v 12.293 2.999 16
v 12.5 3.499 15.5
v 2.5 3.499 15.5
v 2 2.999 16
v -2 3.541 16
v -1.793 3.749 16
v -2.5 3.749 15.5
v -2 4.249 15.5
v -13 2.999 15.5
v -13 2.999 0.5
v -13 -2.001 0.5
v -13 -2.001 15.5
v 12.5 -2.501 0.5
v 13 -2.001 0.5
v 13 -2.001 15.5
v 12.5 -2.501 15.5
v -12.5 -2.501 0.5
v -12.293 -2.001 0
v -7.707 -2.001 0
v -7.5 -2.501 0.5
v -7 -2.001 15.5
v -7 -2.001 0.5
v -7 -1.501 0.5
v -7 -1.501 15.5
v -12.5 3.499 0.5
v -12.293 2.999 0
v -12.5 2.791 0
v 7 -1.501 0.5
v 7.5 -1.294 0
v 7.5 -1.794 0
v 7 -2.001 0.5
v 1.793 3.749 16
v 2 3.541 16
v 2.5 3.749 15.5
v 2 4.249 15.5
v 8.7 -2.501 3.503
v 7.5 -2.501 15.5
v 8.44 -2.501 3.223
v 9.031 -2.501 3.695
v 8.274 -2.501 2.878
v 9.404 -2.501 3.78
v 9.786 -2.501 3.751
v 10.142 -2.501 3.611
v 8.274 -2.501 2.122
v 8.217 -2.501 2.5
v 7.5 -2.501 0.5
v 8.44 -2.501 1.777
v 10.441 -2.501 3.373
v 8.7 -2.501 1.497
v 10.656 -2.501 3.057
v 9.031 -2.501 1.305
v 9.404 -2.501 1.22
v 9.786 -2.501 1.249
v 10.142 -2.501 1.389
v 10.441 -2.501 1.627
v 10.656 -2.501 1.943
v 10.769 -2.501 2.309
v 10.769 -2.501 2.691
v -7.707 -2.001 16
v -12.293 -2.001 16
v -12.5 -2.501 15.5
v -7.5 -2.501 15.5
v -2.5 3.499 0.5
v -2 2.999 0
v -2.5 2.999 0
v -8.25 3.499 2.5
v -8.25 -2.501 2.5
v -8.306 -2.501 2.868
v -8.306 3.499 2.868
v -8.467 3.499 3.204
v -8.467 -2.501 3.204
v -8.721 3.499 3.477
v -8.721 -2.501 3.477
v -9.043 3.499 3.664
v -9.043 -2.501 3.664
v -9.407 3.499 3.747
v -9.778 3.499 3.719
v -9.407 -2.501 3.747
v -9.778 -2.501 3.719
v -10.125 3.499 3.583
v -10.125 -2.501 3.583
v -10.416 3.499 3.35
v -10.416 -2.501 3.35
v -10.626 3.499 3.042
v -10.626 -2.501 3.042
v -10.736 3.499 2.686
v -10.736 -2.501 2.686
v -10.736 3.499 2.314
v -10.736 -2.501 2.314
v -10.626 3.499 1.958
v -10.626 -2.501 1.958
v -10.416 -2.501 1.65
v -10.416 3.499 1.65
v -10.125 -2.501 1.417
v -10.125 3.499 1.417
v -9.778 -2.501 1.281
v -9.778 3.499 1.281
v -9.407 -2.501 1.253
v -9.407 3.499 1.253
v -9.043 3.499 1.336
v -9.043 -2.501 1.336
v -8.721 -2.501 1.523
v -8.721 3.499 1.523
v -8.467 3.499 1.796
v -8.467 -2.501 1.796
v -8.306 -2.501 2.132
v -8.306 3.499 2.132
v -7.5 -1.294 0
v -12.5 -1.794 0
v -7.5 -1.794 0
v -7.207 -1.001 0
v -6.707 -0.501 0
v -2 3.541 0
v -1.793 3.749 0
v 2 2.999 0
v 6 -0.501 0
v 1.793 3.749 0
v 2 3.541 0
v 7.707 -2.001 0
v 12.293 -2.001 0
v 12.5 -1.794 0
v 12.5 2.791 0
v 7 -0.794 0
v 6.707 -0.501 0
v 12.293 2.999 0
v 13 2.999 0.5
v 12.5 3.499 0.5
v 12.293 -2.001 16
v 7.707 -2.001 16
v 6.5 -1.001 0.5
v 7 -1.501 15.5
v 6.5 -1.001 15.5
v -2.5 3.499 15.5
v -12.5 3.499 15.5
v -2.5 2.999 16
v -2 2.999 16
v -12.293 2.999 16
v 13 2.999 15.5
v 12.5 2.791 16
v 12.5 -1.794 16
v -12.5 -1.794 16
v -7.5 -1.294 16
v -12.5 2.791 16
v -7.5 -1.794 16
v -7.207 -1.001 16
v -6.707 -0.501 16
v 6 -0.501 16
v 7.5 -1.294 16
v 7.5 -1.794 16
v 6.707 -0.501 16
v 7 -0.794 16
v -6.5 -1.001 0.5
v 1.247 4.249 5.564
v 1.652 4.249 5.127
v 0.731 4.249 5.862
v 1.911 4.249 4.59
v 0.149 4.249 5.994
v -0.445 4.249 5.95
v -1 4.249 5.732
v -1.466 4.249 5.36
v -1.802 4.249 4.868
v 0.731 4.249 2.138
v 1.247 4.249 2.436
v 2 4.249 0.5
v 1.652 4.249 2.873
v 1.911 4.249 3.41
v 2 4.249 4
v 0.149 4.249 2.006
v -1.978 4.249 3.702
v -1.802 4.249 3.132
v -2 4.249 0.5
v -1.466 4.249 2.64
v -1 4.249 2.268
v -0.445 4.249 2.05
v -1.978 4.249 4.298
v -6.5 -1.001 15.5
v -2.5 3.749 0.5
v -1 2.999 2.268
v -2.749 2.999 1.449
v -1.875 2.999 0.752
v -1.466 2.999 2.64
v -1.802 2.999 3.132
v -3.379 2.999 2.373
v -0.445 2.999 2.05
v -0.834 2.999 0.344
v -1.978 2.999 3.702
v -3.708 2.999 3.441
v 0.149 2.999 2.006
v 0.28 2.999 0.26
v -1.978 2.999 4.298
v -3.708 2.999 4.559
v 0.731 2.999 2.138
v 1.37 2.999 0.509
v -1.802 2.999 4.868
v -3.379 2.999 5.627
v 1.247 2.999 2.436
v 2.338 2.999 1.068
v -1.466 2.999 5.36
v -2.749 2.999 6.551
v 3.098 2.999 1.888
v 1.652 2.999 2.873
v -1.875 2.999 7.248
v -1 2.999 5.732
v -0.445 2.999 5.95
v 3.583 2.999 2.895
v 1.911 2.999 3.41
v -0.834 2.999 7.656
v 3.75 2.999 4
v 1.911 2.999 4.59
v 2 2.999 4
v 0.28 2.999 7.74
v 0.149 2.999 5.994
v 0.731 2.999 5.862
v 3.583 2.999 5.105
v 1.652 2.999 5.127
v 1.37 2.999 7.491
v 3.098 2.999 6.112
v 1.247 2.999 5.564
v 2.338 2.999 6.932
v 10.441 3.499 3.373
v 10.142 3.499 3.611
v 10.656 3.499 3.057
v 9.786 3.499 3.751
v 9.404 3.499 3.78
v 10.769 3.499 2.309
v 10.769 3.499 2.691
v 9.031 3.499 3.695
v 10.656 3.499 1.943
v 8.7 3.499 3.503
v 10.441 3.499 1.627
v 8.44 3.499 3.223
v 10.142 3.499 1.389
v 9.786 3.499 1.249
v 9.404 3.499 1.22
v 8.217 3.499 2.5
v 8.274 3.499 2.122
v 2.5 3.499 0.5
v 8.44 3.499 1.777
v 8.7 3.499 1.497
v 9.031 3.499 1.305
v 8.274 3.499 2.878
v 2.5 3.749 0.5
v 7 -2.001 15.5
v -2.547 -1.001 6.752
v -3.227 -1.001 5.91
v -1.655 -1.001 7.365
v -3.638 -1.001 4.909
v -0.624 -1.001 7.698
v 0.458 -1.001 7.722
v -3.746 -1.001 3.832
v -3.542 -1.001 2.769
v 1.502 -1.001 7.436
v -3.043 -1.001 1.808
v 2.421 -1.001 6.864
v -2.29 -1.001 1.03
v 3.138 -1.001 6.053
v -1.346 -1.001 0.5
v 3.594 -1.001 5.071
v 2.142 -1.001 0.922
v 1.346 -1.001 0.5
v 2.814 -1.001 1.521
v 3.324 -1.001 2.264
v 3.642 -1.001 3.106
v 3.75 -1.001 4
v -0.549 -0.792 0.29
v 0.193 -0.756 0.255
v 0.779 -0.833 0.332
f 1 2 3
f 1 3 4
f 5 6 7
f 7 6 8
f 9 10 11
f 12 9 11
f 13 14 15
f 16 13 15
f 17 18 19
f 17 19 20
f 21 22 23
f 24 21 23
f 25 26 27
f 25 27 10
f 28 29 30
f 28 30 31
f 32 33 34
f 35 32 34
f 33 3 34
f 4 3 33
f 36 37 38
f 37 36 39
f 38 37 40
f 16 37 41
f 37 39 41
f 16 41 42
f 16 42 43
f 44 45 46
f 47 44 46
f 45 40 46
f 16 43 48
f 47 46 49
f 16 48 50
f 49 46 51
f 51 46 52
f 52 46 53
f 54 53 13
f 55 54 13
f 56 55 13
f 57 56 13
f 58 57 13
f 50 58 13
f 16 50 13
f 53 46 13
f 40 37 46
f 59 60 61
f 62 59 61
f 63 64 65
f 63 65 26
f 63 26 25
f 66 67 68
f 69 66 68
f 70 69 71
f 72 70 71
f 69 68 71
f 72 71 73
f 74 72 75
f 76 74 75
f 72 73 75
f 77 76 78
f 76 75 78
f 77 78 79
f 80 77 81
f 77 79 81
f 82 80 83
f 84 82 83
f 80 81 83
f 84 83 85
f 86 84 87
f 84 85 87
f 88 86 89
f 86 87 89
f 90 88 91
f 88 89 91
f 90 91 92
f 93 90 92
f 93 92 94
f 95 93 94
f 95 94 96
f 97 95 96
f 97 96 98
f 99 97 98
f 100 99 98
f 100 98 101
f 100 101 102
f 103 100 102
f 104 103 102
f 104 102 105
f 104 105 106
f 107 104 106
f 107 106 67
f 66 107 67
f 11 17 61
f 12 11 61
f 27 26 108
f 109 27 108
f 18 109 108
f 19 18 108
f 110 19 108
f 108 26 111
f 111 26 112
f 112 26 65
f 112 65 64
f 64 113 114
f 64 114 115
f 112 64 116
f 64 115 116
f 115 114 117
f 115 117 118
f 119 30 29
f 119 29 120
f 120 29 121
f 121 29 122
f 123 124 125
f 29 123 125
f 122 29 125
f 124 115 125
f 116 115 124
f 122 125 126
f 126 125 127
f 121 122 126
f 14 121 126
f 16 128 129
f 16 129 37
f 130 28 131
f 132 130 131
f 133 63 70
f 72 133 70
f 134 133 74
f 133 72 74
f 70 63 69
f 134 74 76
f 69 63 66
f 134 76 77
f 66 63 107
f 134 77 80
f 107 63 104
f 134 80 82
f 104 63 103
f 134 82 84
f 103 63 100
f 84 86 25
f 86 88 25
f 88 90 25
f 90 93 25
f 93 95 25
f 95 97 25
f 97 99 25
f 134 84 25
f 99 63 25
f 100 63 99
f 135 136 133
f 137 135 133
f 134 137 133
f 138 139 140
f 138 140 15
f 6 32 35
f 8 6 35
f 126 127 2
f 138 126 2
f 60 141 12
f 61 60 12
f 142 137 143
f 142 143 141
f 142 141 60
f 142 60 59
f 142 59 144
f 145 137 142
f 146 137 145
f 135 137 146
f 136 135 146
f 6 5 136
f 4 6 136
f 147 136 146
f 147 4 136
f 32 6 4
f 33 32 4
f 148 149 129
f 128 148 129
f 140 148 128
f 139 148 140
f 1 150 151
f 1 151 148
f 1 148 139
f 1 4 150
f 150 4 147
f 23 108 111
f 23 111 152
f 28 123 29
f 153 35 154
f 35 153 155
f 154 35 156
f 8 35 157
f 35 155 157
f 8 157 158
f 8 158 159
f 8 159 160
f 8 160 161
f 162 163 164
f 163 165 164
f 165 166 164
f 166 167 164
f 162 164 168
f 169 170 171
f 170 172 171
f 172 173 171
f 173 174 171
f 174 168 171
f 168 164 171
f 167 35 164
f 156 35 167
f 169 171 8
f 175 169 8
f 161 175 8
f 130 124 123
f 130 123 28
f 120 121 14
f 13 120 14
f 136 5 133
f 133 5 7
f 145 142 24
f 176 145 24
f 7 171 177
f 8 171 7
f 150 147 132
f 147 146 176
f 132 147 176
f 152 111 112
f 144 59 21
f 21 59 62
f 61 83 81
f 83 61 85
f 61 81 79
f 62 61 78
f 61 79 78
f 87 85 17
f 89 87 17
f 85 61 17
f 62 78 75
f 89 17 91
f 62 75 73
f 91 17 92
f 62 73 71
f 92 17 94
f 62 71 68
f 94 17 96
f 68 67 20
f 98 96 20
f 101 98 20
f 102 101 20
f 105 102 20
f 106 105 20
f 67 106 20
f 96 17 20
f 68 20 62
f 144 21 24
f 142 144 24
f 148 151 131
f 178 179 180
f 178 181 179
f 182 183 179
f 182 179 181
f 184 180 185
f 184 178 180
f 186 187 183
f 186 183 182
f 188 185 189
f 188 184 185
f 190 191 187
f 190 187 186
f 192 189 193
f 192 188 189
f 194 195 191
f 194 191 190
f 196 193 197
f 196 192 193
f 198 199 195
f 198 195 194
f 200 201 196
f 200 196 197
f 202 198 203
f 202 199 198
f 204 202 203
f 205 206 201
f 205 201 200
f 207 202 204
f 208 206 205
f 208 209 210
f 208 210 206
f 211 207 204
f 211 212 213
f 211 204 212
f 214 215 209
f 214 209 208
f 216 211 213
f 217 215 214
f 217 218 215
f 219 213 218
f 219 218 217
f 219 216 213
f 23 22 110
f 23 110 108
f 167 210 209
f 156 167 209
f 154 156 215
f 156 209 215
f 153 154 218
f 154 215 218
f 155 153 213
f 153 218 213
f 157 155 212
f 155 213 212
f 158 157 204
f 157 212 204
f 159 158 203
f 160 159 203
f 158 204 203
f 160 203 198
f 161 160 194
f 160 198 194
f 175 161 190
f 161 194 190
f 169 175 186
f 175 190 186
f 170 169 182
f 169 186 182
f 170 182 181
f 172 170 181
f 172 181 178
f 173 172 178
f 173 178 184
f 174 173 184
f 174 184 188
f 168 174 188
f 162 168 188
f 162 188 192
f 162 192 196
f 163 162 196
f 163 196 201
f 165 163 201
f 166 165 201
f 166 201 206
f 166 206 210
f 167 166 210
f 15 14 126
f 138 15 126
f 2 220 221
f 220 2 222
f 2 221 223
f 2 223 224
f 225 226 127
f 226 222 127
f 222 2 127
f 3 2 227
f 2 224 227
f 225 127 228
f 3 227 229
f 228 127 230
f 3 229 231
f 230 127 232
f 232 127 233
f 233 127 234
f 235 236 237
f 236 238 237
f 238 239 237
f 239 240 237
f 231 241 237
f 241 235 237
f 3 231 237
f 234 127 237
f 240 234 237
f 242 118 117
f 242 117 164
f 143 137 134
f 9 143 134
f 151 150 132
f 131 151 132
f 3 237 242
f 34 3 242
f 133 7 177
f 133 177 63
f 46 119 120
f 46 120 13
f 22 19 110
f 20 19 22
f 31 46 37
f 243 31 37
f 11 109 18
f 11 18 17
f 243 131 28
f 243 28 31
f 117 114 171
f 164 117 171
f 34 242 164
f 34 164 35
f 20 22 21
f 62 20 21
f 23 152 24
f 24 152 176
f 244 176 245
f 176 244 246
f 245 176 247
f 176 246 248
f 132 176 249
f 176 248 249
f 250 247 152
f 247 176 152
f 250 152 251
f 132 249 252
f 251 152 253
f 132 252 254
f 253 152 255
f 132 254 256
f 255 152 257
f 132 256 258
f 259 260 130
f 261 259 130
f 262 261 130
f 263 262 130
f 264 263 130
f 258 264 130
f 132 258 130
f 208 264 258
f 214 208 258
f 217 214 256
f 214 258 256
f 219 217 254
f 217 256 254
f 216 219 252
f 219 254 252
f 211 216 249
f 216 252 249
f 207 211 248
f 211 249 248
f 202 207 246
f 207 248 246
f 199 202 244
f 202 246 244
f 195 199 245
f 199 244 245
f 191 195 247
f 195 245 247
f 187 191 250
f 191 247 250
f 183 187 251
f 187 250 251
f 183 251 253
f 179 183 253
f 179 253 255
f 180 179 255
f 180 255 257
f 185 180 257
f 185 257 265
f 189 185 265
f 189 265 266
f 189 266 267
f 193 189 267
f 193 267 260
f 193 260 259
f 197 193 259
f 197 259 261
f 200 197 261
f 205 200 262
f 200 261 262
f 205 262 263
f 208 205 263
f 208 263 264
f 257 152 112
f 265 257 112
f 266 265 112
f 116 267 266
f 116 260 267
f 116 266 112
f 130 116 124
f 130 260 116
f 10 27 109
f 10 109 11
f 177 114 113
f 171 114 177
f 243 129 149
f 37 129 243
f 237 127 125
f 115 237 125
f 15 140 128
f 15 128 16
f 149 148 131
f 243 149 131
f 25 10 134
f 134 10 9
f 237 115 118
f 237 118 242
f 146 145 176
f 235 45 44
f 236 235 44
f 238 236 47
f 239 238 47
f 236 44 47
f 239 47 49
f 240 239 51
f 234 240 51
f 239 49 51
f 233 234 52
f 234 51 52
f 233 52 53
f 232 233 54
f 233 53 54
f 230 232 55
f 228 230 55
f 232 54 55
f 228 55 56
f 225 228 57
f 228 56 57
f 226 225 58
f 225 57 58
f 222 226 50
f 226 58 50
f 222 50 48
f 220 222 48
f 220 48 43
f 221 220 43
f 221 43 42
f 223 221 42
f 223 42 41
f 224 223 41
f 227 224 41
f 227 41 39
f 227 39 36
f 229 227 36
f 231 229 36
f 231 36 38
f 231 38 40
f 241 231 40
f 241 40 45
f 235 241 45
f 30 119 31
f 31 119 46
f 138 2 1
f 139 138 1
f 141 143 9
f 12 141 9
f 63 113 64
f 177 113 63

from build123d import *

# Parameters (mm, degrees)
F1_DEPTH      = 16
F3_R          = 1.25
F4_DEPTH      = 25
F5_R          = 2
F6_DEPTH      = 25
F5_R_2        = 3.75
F7_DEPTH      = 4
F8_SIZE       = 0.49999
F9_T1_DEPTH   = 3.278775627
F9_T3_DEPTH   = 7.571702988
F9_T5_DEPTH   = 3.278775627
F9_T7_DEPTH   = 6.571702988
F9_T9_DEPTH   = 7.571702988
F9_T11_DEPTH  = 3.278775627
F9_T13_DEPTH  = 3.278775627
F9_T15_DEPTH  = 3.278775627
F9_T17_DEPTH  = 7.571702988
F9_T19_DEPTH  = 3.278775627
F9_T24_DEPTH  = 12.571692988
F9_T29_DEPTH  = 2.821692988
F9_T34_DEPTH  = 3.278775627
F9_T39_DEPTH  = 3.278775627
F9_T44_DEPTH  = 2.821692988
F9_T49_DEPTH  = 3.071702988
F9_T54_DEPTH  = 12.571692988
F9_T59_DEPTH  = 3.278775627
F9_T65_DEPTH  = 15.571702988
F9_T71_DEPTH  = 3.278775627
F9_T77_DEPTH  = 3.071702988
F9_T82_DEPTH  = 12.571692988
F9_T87_DEPTH  = 2.821692988
F9_T92_DEPTH  = 3.278775627
F9_T97_DEPTH  = 3.278775627
F9_T102_DEPTH = 2.821692988
F9_T107_DEPTH = 3.071702988
F9_T112_DEPTH = 12.571692988
F9_T117_DEPTH = 3.278775627
F9_T123_DEPTH = 15.571702988
F9_T129_DEPTH = 3.278775627
F9_T135_DEPTH = 3.071702988


# Not quite as in the source:
# - a fillet or chamfer that OpenCascade refuses, or shapes differently, is made with other operations: its cross-section is extruded or revolved along the edge and cut away or added
# - a fillet or chamfer is up to 0.001 mm smaller than in the source, because OpenCascade refuses the exact size


with BuildPart() as f1:
    # F0 (on Top) → F1 (new body)
    with BuildSketch(Plane.XY):
        Polygon((-2.5, 3.4985319469), (-13, 3.4985319469), (-13, -2.5014680531), (-7, -2.5014680531), (-7, -1.0014680531), (7, -1.0014680531), (7, -2.5014680531), (13, -2.5014680531), (13, 3.4985319469), (2.5, 3.4985319469), (2.5, 4.2485319469), (-2.5, 4.2485319469), align=None)
    extrude(amount=F1_DEPTH)

    # F3 (on offset) → F4 (cut)
    with BuildSketch(Plane.XZ.offset(2.5014680531)):
        with Locations((-9.5, 2.5)):
            Circle(F3_R)
        with BuildLine():
            ThreePointArc((10.7833518404, 2.5), (9.5, 3.7833518404), (8.2166481596, 2.5))
            ThreePointArc((8.2166481596, 2.5), (9.5, 1.2166481596), (10.7833518404, 2.5))
        make_face()
    extrude(amount=-F4_DEPTH, mode=Mode.SUBTRACT)

    # F5 (on face) → F6 (cut)
    with BuildSketch(Plane.XZ.offset(1.0014680531)):
        with Locations((0, 4)):
            Circle(F5_R)
    extrude(amount=-F6_DEPTH, mode=Mode.SUBTRACT)

    # F5 (on face) → F7 (cut)
    with BuildSketch(Plane.XZ.offset(1.0014680531)):
        with Locations((0, 4)):
            Circle(F5_R_2)
        with Locations((0, 4)):
            Circle(F5_R, mode=Mode.SUBTRACT)
    extrude(amount=-F7_DEPTH, mode=Mode.SUBTRACT)

    # F8 (size 0.5 in the source; OpenCascade refuses exactly that, so slightly less here)
    f8_edges = [f1.edges().sort_by_distance(p)[0] for p in [
        (-2.5, 4.248532, 8),
        (2.5, 4.248532, 8),
        (13, 3.498532, 8),
        (-13, 3.498532, 8),
        (-13, -2.501468, 8),
        (7, -2.501468, 8),
        (13, -2.501468, 8),
        (-7, -2.501468, 8),
        (-7, -1.001468, 8),
        (7, -1.001468, 8),
    ]]
    chamfer(f8_edges, length=F8_SIZE)

    # F9: chamfer of 0.5 on 44 edges, made by hand

    # F9_s2 → F9_t1 (cut)
    with BuildSketch(Plane(origin=(3.5915117866, -3.5915117866, 0), x_dir=(0, 0, 1), z_dir=(0.7071067812, -0.7071067812, 0))):
        Polygon((15.5, -11.3126774998), (16, -10.8126774998), (16, -11.3126774998), align=None)
        Polygon((0, -10.8126774998), (0.5, -11.3126774998), (0, -11.3126774998), align=None)
    extrude(amount=F9_T1_DEPTH, mode=Mode.SUBTRACT)

    # F9_s4 → F9_t3 (cut)
    with BuildSketch(Plane.XZ.offset(-4.2843834409)):
        Polygon((12.5, 16), (13, 15.5), (13, 16), align=None)
        Polygon((-12.5, 16), (-13, 15.5), (-13, 16), align=None)
        Polygon((12.5, 0), (13, 0.5), (13, 0), align=None)
        Polygon((-12.5, 0), (-13, 0.5), (-13, 0), align=None)
    extrude(amount=F9_T3_DEPTH, mode=Mode.SUBTRACT)

    # F9_s6 → F9_t5 (cut)
    with BuildSketch(Plane(origin=(6.4084882134, 6.4084882134, 0), x_dir=(0, 0, 1), z_dir=(-0.7071067812, -0.7071067812, 0))):
        Polygon((16, -10.1076468592), (15.5, -10.6076468592), (16, -10.6076468592), align=None)
        Polygon((0, -10.1076468592), (0.5, -10.6076468592), (0, -10.6076468592), align=None)
    extrude(amount=F9_T5_DEPTH, mode=Mode.SUBTRACT)

    # F9_s8 → F9_t7 (cut)
    with BuildSketch(Plane.YZ.offset(-3.285851494)):
        Polygon((3.7485319469, 16), (4.2485319469, 15.5), (4.2485319469, 16), align=None)
        Polygon((3.7485319469, 0), (4.2485319469, 0.5), (4.2485319469, 0), align=None)
    extrude(amount=F9_T7_DEPTH, mode=Mode.SUBTRACT)

    # F9_s10 → F9_t9 (cut)
    with BuildSketch(Plane.YZ.offset(6.214148506)):
        Polygon((-2.0014680531, 16), (-2.5014680531, 15.5), (-2.5014680531, 16), align=None)
        Polygon((-2.0014680531, 0), (-2.5014680531, 0.5), (-2.5014680531, 0), align=None)
    extrude(amount=F9_T9_DEPTH, mode=Mode.SUBTRACT)

    # F9_s12 → F9_t11 (cut)
    with BuildSketch(Plane(origin=(5.9099562665, -5.9099562665, 0), x_dir=(0, 0, 1), z_dir=(-0.7071067812, 0.7071067812, 0))):
        Polygon((16, 4.0344887646), (15.5, 3.5344887646), (16, 3.5344887646), align=None)
        Polygon((0, 4.0344887646), (0.5, 3.5344887646), (0, 3.5344887646), align=None)
    extrude(amount=F9_T11_DEPTH, mode=Mode.SUBTRACT)

    # F9_s14 → F9_t13 (cut)
    with BuildSketch(Plane(origin=(-3.5915117866, -3.5915117866, 0), x_dir=(0, 0, 1), z_dir=(-0.7071067812, -0.7071067812, 0))):
        Polygon((16, 10.8126774998), (15.5, 11.3126774998), (16, 11.3126774998), align=None)
        Polygon((0, 10.8126774998), (0.5, 11.3126774998), (0, 11.3126774998), align=None)
    extrude(amount=F9_T13_DEPTH, mode=Mode.SUBTRACT)

    # F9_s16 → F9_t15 (cut)
    with BuildSketch(Plane(origin=(-6.4084882134, 6.4084882134, 0), x_dir=(0, 0, 1), z_dir=(0.7071067812, -0.7071067812, 0))):
        Polygon((16, 10.1076468592), (15.5, 10.6076468592), (16, 10.6076468592), align=None)
        Polygon((0, 10.1076468592), (0.5, 10.6076468592), (0, 10.6076468592), align=None)
    extrude(amount=F9_T15_DEPTH, mode=Mode.SUBTRACT)

    # F9_s18 → F9_t17 (cut)
    with BuildSketch(Plane.YZ.offset(-13.785851494)):
        Polygon((-2.0014680531, 16), (-2.5014680531, 15.5), (-2.5014680531, 16), align=None)
        Polygon((-2.0014680531, 0), (-2.5014680531, 0.5), (-2.5014680531, 0), align=None)
    extrude(amount=F9_T17_DEPTH, mode=Mode.SUBTRACT)

    # F9_s20 → F9_t19 (cut)
    with BuildSketch(Plane(origin=(-5.9099562665, -5.9099562665, 0), x_dir=(0, 0, 1), z_dir=(0.7071067812, 0.7071067812, 0))):
        Polygon((16, -4.0344887646), (15.5, -3.5344887646), (16, -3.5344887646), align=None)
        Polygon((0, -4.0344887646), (0.5, -3.5344887646), (0, -3.5344887646), align=None)
    extrude(amount=F9_T19_DEPTH, mode=Mode.SUBTRACT)


with BuildPart() as f9_tool22:
    # F9_s23 → F9_t24 (new body)
    with BuildSketch(Plane.YZ.offset(13.785851494)):
        Polygon((3.4985319469, 15.5), (2.9985319469, 16), (3.4985319469, 16), align=None)
    extrude(amount=-F9_T24_DEPTH)

    split(bisect_by=Plane(origin=(9, 0, 9), x_dir=(0, 1, 0), z_dir=(0.7071067812, 0, 0.7071067812)), keep=Keep.TOP)


with BuildPart() as f1_1:
    add(f1.part)

    # F9_t21: cut F9_tool22
    add(f9_tool22.part, mode=Mode.SUBTRACT)


with BuildPart() as f9_tool27:
    # F9_s28 → F9_t29 (new body)
    with BuildSketch(Plane.XZ.offset(-2.2126904529)):
        Polygon((2.5, 15.5), (2, 16), (2.5, 16), align=None)
    extrude(amount=-F9_T29_DEPTH)

    split(bisect_by=Plane(origin=(0, 9.4992659735, 9.4992659735), x_dir=(1, 0, 0), z_dir=(0, 0.7071067812, 0.7071067812)), keep=Keep.TOP)


with BuildPart() as f1_2:
    add(f1_1.part)

    # F9_t26: cut F9_tool27
    add(f9_tool27.part, mode=Mode.SUBTRACT)


with BuildPart() as f9_tool32:
    # F9_s33 → F9_t34 (new body)
    with BuildSketch(Plane(origin=(0.2849562665, -0.2849562665, 0), x_dir=(0, 0, 1), z_dir=(-0.7071067812, 0.7071067812, 0))):
        Polygon((16, 3.9183863832), (15.5, 4.4183863832), (16, 4.4183863832), align=None)
    extrude(amount=F9_T34_DEPTH)

    split(bisect_by=Plane.YZ.offset(2.5), keep=Keep.BOTTOM)


with BuildPart() as f1_3:
    add(f1_2.part)

    # F9_t31: cut F9_tool32
    add(f9_tool32.part, mode=Mode.SUBTRACT)


with BuildPart() as f9_tool37:
    # F9_s38 → F9_t39 (new body)
    with BuildSketch(Plane(origin=(2.0334882134, 2.0334882134, 0), x_dir=(0, 0, 1), z_dir=(-0.7071067812, -0.7071067812, 0))):
        Polygon((16, 3.9183863832), (15.5, 4.4183863832), (16, 4.4183863832), align=None)
    extrude(amount=F9_T39_DEPTH)

    split(bisect_by=Plane.YZ.offset(-2.5), keep=Keep.TOP)


with BuildPart() as f1_4:
    add(f1_3.part)

    # F9_t36: cut F9_tool37
    add(f9_tool37.part, mode=Mode.SUBTRACT)


with BuildPart() as f9_tool42:
    # F9_s43 → F9_t44 (new body)
    with BuildSketch(Plane.XZ.offset(-5.0343834409)):
        Polygon((-2, 16), (-2.5, 15.5), (-2.5, 16), align=None)
    extrude(amount=F9_T44_DEPTH)

    split(bisect_by=Plane(origin=(0, 9.4992659735, 9.4992659735), x_dir=(1, 0, 0), z_dir=(0, 0.7071067812, 0.7071067812)), keep=Keep.TOP)


with BuildPart() as f1_5:
    add(f1_4.part)

    # F9_t41: cut F9_tool42
    add(f9_tool42.part, mode=Mode.SUBTRACT)


with BuildPart() as f9_tool47:
    # F9_s48 → F9_t49 (new body)
    with BuildSketch(Plane.XZ.offset(0.2156165591)):
        Polygon((7.5, 16), (7, 15.5), (7, 16), align=None)
    extrude(amount=F9_T49_DEPTH)

    split(bisect_by=Plane(origin=(-4.1054420675, -4.1054420675, 5.8059718513), x_dir=(0.7071067812, -0.7071067812, 0), z_dir=(-0.5, -0.5, 0.7071067812)), keep=Keep.TOP)


with BuildPart() as f1_6:
    add(f1_5.part)

    # F9_t46: cut F9_tool47
    add(f9_tool47.part, mode=Mode.SUBTRACT)


with BuildPart() as f9_tool52:
    # F9_s53 → F9_t54 (new body)
    with BuildSketch(Plane.YZ.offset(-1.214158506)):
        Polygon((2.9985319469, 16), (3.4985319469, 15.5), (3.4985319469, 16), align=None)
    extrude(amount=-F9_T54_DEPTH)

    split(bisect_by=Plane(origin=(-9, 0, 9), x_dir=(0, 1, 0), z_dir=(-0.7071067812, 0, 0.7071067812)), keep=Keep.TOP)


with BuildPart() as f1_7:
    add(f1_6.part)

    # F9_t51: cut F9_tool52
    add(f9_tool52.part, mode=Mode.SUBTRACT)


with BuildPart() as f9_tool57:
    # F9_s58 → F9_t59 (new body)
    with BuildSketch(Plane(origin=(2.8415117866, -2.8415117866, 0), x_dir=(0, 0, 1), z_dir=(0.7071067812, -0.7071067812, 0))):
        Polygon((16, -4.3880562973), (15.5, -3.8880562973), (16, -3.8880562973), align=None)
    extrude(amount=F9_T59_DEPTH)

    split(bisect_by=Plane(origin=(0, -8.2507340265, 8.2507340265), x_dir=(1, 0, 0), z_dir=(0, -0.7071067812, 0.7071067812)), keep=Keep.TOP)

    split(bisect_by=Plane(origin=(-4.25, 0, 4.25), x_dir=(0, 1, 0), z_dir=(-0.7071067812, 0, 0.7071067812)), keep=Keep.TOP)


with BuildPart() as f1_8:
    add(f1_7.part)

    # F9_t56: cut F9_tool57
    add(f9_tool57.part, mode=Mode.SUBTRACT)


with BuildPart() as f9_tool63:
    # F9_s64 → F9_t65 (new body)
    with BuildSketch(Plane.YZ.offset(-7.785851494)):
        Polygon((-0.5014680531, 16), (-1.0014680531, 15.5), (-1.0014680531, 16), align=None)
    extrude(amount=F9_T65_DEPTH)

    split(bisect_by=Plane(origin=(-4.1054420675, -4.1054420675, 5.8059718513), x_dir=(0.7071067812, -0.7071067812, 0), z_dir=(-0.5, -0.5, 0.7071067812)), keep=Keep.TOP)

    split(bisect_by=Plane(origin=(4.1054420675, -4.1054420675, 5.8059718513), x_dir=(0.7071067812, 0.7071067812, 0), z_dir=(0.5, -0.5, 0.7071067812)), keep=Keep.TOP)


with BuildPart() as f1_9:
    add(f1_8.part)

    # F9_t62: cut F9_tool63
    add(f9_tool63.part, mode=Mode.SUBTRACT)


with BuildPart() as f9_tool69:
    # F9_s70 → F9_t71 (new body)
    with BuildSketch(Plane(origin=(-5.1599562665, -5.1599562665, 0), x_dir=(0, 0, 1), z_dir=(0.7071067812, 0.7071067812, 0))):
        Polygon((16, -4.3880562973), (15.5, -3.8880562973), (16, -3.8880562973), align=None)
    extrude(amount=F9_T71_DEPTH)

    split(bisect_by=Plane(origin=(0, -8.2507340265, 8.2507340265), x_dir=(1, 0, 0), z_dir=(0, -0.7071067812, 0.7071067812)), keep=Keep.TOP)

    split(bisect_by=Plane(origin=(4.25, 0, 4.25), x_dir=(0, 1, 0), z_dir=(0.7071067812, 0, 0.7071067812)), keep=Keep.TOP)


with BuildPart() as f1_10:
    add(f1_9.part)

    # F9_t68: cut F9_tool69
    add(f9_tool69.part, mode=Mode.SUBTRACT)


with BuildPart() as f9_tool75:
    # F9_s76 → F9_t77 (new body)
    with BuildSketch(Plane.XZ.offset(3.2873195471)):
        Polygon((-7.5, 16), (-7, 15.5), (-7, 16), align=None)
    extrude(amount=-F9_T77_DEPTH)

    split(bisect_by=Plane(origin=(4.1054420675, -4.1054420675, 5.8059718513), x_dir=(0.7071067812, 0.7071067812, 0), z_dir=(0.5, -0.5, 0.7071067812)), keep=Keep.TOP)


with BuildPart() as f1_11:
    add(f1_10.part)

    # F9_t74: cut F9_tool75
    add(f9_tool75.part, mode=Mode.SUBTRACT)


with BuildPart() as f9_tool80:
    # F9_s81 → F9_t82 (new body)
    with BuildSketch(Plane.YZ.offset(13.785851494)):
        Polygon((3.4985319469, 0.5), (2.9985319469, 0), (3.4985319469, 0), align=None)
    extrude(amount=-F9_T82_DEPTH)

    split(bisect_by=Plane(origin=(1, 0, -1), x_dir=(0, 1, 0), z_dir=(0.7071067812, 0, -0.7071067812)), keep=Keep.TOP)


with BuildPart() as f1_12:
    add(f1_11.part)

    # F9_t79: cut F9_tool80
    add(f9_tool80.part, mode=Mode.SUBTRACT)


with BuildPart() as f9_tool85:
    # F9_s86 → F9_t87 (new body)
    with BuildSketch(Plane.XZ.offset(-2.2126904529)):
        Polygon((2, 0), (2.5, 0.5), (2.5, 0), align=None)
    extrude(amount=-F9_T87_DEPTH)

    split(bisect_by=Plane(origin=(0, 1.4992659735, -1.4992659735), x_dir=(1, 0, 0), z_dir=(0, 0.7071067812, -0.7071067812)), keep=Keep.TOP)


with BuildPart() as f1_13:
    add(f1_12.part)

    # F9_t84: cut F9_tool85
    add(f9_tool85.part, mode=Mode.SUBTRACT)


with BuildPart() as f9_tool90:
    # F9_s91 → F9_t92 (new body)
    with BuildSketch(Plane(origin=(0.2849562665, -0.2849562665, 0), x_dir=(0, 0, 1), z_dir=(-0.7071067812, 0.7071067812, 0))):
        Polygon((0, 3.9183863832), (0.5, 4.4183863832), (0, 4.4183863832), align=None)
    extrude(amount=F9_T92_DEPTH)

    split(bisect_by=Plane.YZ.offset(2.5), keep=Keep.BOTTOM)


with BuildPart() as f1_14:
    add(f1_13.part)

    # F9_t89: cut F9_tool90
    add(f9_tool90.part, mode=Mode.SUBTRACT)


with BuildPart() as f9_tool95:
    # F9_s96 → F9_t97 (new body)
    with BuildSketch(Plane(origin=(2.0334882134, 2.0334882134, 0), x_dir=(0, 0, 1), z_dir=(-0.7071067812, -0.7071067812, 0))):
        Polygon((0, 3.9183863832), (0.5, 4.4183863832), (0, 4.4183863832), align=None)
    extrude(amount=F9_T97_DEPTH)

    split(bisect_by=Plane.YZ.offset(-2.5), keep=Keep.TOP)


with BuildPart() as f1_15:
    add(f1_14.part)

    # F9_t94: cut F9_tool95
    add(f9_tool95.part, mode=Mode.SUBTRACT)


with BuildPart() as f9_tool100:
    # F9_s101 → F9_t102 (new body)
    with BuildSketch(Plane.XZ.offset(-5.0343834409)):
        Polygon((-2, 0), (-2.5, 0.5), (-2.5, 0), align=None)
    extrude(amount=F9_T102_DEPTH)

    split(bisect_by=Plane(origin=(0, 1.4992659735, -1.4992659735), x_dir=(1, 0, 0), z_dir=(0, 0.7071067812, -0.7071067812)), keep=Keep.TOP)


with BuildPart() as f1_16:
    add(f1_15.part)

    # F9_t99: cut F9_tool100
    add(f9_tool100.part, mode=Mode.SUBTRACT)


with BuildPart() as f9_tool105:
    # F9_s106 → F9_t107 (new body)
    with BuildSketch(Plane.XZ.offset(0.2156165591)):
        Polygon((7.5, 0), (7, 0.5), (7, 0), align=None)
    extrude(amount=F9_T107_DEPTH)

    split(bisect_by=Plane(origin=(1.551412182, 1.551412182, 2.1940281487), x_dir=(0.7071067812, -0.7071067812, 0), z_dir=(-0.5, -0.5, -0.7071067812)), keep=Keep.TOP)


with BuildPart() as f1_17:
    add(f1_16.part)

    # F9_t104: cut F9_tool105
    add(f9_tool105.part, mode=Mode.SUBTRACT)


with BuildPart() as f9_tool110:
    # F9_s111 → F9_t112 (new body)
    with BuildSketch(Plane.YZ.offset(-1.214158506)):
        Polygon((2.9985319469, 0), (3.4985319469, 0.5), (3.4985319469, 0), align=None)
    extrude(amount=-F9_T112_DEPTH)

    split(bisect_by=Plane(origin=(-1, 0, -1), x_dir=(0, 1, 0), z_dir=(-0.7071067812, 0, -0.7071067812)), keep=Keep.TOP)


with BuildPart() as f1_18:
    add(f1_17.part)

    # F9_t109: cut F9_tool110
    add(f9_tool110.part, mode=Mode.SUBTRACT)


with BuildPart() as f9_tool115:
    # F9_s116 → F9_t117 (new body)
    with BuildSketch(Plane(origin=(2.8415117866, -2.8415117866, 0), x_dir=(0, 0, 1), z_dir=(0.7071067812, -0.7071067812, 0))):
        Polygon((0, -4.3880562973), (0.5, -3.8880562973), (0, -3.8880562973), align=None)
    extrude(amount=F9_T117_DEPTH)

    split(bisect_by=Plane(origin=(0, -0.2507340265, -0.2507340265), x_dir=(1, 0, 0), z_dir=(0, -0.7071067812, -0.7071067812)), keep=Keep.TOP)

    split(bisect_by=Plane(origin=(3.75, 0, 3.75), x_dir=(0, 1, 0), z_dir=(-0.7071067812, 0, -0.7071067812)), keep=Keep.TOP)


with BuildPart() as f1_19:
    add(f1_18.part)

    # F9_t114: cut F9_tool115
    add(f9_tool115.part, mode=Mode.SUBTRACT)


with BuildPart() as f9_tool121:
    # F9_s122 → F9_t123 (new body)
    with BuildSketch(Plane.YZ.offset(-7.785851494)):
        Polygon((-0.5014680531, 0), (-1.0014680531, 0.5), (-1.0014680531, 0), align=None)
    extrude(amount=F9_T123_DEPTH)

    split(bisect_by=Plane(origin=(1.551412182, 1.551412182, 2.1940281487), x_dir=(0.7071067812, -0.7071067812, 0), z_dir=(-0.5, -0.5, -0.7071067812)), keep=Keep.TOP)

    split(bisect_by=Plane(origin=(-1.551412182, 1.551412182, 2.1940281487), x_dir=(0.7071067812, 0.7071067812, 0), z_dir=(0.5, -0.5, -0.7071067812)), keep=Keep.TOP)


with BuildPart() as f1_20:
    add(f1_19.part)

    # F9_t120: cut F9_tool121
    add(f9_tool121.part, mode=Mode.SUBTRACT)


with BuildPart() as f9_tool127:
    # F9_s128 → F9_t129 (new body)
    with BuildSketch(Plane(origin=(-5.1599562665, -5.1599562665, 0), x_dir=(0, 0, 1), z_dir=(0.7071067812, 0.7071067812, 0))):
        Polygon((0, -4.3880562973), (0.5, -3.8880562973), (0, -3.8880562973), align=None)
    extrude(amount=F9_T129_DEPTH)

    split(bisect_by=Plane(origin=(0, -0.2507340265, -0.2507340265), x_dir=(1, 0, 0), z_dir=(0, -0.7071067812, -0.7071067812)), keep=Keep.TOP)

    split(bisect_by=Plane(origin=(-3.75, 0, 3.75), x_dir=(0, 1, 0), z_dir=(0.7071067812, 0, -0.7071067812)), keep=Keep.TOP)


with BuildPart() as f1_21:
    add(f1_20.part)

    # F9_t126: cut F9_tool127
    add(f9_tool127.part, mode=Mode.SUBTRACT)


with BuildPart() as f9_tool133:
    # F9_s134 → F9_t135 (new body)
    with BuildSketch(Plane.XZ.offset(3.2873195471)):
        Polygon((-7.5, 0), (-7, 0.5), (-7, 0), align=None)
    extrude(amount=-F9_T135_DEPTH)

    split(bisect_by=Plane(origin=(-1.551412182, 1.551412182, 2.1940281487), x_dir=(0.7071067812, 0.7071067812, 0), z_dir=(0.5, -0.5, -0.7071067812)), keep=Keep.TOP)


with BuildPart() as f1_22:
    add(f1_21.part)

    # F9_t132: cut F9_tool133
    add(f9_tool133.part, mode=Mode.SUBTRACT)


solid = f1_22.part
